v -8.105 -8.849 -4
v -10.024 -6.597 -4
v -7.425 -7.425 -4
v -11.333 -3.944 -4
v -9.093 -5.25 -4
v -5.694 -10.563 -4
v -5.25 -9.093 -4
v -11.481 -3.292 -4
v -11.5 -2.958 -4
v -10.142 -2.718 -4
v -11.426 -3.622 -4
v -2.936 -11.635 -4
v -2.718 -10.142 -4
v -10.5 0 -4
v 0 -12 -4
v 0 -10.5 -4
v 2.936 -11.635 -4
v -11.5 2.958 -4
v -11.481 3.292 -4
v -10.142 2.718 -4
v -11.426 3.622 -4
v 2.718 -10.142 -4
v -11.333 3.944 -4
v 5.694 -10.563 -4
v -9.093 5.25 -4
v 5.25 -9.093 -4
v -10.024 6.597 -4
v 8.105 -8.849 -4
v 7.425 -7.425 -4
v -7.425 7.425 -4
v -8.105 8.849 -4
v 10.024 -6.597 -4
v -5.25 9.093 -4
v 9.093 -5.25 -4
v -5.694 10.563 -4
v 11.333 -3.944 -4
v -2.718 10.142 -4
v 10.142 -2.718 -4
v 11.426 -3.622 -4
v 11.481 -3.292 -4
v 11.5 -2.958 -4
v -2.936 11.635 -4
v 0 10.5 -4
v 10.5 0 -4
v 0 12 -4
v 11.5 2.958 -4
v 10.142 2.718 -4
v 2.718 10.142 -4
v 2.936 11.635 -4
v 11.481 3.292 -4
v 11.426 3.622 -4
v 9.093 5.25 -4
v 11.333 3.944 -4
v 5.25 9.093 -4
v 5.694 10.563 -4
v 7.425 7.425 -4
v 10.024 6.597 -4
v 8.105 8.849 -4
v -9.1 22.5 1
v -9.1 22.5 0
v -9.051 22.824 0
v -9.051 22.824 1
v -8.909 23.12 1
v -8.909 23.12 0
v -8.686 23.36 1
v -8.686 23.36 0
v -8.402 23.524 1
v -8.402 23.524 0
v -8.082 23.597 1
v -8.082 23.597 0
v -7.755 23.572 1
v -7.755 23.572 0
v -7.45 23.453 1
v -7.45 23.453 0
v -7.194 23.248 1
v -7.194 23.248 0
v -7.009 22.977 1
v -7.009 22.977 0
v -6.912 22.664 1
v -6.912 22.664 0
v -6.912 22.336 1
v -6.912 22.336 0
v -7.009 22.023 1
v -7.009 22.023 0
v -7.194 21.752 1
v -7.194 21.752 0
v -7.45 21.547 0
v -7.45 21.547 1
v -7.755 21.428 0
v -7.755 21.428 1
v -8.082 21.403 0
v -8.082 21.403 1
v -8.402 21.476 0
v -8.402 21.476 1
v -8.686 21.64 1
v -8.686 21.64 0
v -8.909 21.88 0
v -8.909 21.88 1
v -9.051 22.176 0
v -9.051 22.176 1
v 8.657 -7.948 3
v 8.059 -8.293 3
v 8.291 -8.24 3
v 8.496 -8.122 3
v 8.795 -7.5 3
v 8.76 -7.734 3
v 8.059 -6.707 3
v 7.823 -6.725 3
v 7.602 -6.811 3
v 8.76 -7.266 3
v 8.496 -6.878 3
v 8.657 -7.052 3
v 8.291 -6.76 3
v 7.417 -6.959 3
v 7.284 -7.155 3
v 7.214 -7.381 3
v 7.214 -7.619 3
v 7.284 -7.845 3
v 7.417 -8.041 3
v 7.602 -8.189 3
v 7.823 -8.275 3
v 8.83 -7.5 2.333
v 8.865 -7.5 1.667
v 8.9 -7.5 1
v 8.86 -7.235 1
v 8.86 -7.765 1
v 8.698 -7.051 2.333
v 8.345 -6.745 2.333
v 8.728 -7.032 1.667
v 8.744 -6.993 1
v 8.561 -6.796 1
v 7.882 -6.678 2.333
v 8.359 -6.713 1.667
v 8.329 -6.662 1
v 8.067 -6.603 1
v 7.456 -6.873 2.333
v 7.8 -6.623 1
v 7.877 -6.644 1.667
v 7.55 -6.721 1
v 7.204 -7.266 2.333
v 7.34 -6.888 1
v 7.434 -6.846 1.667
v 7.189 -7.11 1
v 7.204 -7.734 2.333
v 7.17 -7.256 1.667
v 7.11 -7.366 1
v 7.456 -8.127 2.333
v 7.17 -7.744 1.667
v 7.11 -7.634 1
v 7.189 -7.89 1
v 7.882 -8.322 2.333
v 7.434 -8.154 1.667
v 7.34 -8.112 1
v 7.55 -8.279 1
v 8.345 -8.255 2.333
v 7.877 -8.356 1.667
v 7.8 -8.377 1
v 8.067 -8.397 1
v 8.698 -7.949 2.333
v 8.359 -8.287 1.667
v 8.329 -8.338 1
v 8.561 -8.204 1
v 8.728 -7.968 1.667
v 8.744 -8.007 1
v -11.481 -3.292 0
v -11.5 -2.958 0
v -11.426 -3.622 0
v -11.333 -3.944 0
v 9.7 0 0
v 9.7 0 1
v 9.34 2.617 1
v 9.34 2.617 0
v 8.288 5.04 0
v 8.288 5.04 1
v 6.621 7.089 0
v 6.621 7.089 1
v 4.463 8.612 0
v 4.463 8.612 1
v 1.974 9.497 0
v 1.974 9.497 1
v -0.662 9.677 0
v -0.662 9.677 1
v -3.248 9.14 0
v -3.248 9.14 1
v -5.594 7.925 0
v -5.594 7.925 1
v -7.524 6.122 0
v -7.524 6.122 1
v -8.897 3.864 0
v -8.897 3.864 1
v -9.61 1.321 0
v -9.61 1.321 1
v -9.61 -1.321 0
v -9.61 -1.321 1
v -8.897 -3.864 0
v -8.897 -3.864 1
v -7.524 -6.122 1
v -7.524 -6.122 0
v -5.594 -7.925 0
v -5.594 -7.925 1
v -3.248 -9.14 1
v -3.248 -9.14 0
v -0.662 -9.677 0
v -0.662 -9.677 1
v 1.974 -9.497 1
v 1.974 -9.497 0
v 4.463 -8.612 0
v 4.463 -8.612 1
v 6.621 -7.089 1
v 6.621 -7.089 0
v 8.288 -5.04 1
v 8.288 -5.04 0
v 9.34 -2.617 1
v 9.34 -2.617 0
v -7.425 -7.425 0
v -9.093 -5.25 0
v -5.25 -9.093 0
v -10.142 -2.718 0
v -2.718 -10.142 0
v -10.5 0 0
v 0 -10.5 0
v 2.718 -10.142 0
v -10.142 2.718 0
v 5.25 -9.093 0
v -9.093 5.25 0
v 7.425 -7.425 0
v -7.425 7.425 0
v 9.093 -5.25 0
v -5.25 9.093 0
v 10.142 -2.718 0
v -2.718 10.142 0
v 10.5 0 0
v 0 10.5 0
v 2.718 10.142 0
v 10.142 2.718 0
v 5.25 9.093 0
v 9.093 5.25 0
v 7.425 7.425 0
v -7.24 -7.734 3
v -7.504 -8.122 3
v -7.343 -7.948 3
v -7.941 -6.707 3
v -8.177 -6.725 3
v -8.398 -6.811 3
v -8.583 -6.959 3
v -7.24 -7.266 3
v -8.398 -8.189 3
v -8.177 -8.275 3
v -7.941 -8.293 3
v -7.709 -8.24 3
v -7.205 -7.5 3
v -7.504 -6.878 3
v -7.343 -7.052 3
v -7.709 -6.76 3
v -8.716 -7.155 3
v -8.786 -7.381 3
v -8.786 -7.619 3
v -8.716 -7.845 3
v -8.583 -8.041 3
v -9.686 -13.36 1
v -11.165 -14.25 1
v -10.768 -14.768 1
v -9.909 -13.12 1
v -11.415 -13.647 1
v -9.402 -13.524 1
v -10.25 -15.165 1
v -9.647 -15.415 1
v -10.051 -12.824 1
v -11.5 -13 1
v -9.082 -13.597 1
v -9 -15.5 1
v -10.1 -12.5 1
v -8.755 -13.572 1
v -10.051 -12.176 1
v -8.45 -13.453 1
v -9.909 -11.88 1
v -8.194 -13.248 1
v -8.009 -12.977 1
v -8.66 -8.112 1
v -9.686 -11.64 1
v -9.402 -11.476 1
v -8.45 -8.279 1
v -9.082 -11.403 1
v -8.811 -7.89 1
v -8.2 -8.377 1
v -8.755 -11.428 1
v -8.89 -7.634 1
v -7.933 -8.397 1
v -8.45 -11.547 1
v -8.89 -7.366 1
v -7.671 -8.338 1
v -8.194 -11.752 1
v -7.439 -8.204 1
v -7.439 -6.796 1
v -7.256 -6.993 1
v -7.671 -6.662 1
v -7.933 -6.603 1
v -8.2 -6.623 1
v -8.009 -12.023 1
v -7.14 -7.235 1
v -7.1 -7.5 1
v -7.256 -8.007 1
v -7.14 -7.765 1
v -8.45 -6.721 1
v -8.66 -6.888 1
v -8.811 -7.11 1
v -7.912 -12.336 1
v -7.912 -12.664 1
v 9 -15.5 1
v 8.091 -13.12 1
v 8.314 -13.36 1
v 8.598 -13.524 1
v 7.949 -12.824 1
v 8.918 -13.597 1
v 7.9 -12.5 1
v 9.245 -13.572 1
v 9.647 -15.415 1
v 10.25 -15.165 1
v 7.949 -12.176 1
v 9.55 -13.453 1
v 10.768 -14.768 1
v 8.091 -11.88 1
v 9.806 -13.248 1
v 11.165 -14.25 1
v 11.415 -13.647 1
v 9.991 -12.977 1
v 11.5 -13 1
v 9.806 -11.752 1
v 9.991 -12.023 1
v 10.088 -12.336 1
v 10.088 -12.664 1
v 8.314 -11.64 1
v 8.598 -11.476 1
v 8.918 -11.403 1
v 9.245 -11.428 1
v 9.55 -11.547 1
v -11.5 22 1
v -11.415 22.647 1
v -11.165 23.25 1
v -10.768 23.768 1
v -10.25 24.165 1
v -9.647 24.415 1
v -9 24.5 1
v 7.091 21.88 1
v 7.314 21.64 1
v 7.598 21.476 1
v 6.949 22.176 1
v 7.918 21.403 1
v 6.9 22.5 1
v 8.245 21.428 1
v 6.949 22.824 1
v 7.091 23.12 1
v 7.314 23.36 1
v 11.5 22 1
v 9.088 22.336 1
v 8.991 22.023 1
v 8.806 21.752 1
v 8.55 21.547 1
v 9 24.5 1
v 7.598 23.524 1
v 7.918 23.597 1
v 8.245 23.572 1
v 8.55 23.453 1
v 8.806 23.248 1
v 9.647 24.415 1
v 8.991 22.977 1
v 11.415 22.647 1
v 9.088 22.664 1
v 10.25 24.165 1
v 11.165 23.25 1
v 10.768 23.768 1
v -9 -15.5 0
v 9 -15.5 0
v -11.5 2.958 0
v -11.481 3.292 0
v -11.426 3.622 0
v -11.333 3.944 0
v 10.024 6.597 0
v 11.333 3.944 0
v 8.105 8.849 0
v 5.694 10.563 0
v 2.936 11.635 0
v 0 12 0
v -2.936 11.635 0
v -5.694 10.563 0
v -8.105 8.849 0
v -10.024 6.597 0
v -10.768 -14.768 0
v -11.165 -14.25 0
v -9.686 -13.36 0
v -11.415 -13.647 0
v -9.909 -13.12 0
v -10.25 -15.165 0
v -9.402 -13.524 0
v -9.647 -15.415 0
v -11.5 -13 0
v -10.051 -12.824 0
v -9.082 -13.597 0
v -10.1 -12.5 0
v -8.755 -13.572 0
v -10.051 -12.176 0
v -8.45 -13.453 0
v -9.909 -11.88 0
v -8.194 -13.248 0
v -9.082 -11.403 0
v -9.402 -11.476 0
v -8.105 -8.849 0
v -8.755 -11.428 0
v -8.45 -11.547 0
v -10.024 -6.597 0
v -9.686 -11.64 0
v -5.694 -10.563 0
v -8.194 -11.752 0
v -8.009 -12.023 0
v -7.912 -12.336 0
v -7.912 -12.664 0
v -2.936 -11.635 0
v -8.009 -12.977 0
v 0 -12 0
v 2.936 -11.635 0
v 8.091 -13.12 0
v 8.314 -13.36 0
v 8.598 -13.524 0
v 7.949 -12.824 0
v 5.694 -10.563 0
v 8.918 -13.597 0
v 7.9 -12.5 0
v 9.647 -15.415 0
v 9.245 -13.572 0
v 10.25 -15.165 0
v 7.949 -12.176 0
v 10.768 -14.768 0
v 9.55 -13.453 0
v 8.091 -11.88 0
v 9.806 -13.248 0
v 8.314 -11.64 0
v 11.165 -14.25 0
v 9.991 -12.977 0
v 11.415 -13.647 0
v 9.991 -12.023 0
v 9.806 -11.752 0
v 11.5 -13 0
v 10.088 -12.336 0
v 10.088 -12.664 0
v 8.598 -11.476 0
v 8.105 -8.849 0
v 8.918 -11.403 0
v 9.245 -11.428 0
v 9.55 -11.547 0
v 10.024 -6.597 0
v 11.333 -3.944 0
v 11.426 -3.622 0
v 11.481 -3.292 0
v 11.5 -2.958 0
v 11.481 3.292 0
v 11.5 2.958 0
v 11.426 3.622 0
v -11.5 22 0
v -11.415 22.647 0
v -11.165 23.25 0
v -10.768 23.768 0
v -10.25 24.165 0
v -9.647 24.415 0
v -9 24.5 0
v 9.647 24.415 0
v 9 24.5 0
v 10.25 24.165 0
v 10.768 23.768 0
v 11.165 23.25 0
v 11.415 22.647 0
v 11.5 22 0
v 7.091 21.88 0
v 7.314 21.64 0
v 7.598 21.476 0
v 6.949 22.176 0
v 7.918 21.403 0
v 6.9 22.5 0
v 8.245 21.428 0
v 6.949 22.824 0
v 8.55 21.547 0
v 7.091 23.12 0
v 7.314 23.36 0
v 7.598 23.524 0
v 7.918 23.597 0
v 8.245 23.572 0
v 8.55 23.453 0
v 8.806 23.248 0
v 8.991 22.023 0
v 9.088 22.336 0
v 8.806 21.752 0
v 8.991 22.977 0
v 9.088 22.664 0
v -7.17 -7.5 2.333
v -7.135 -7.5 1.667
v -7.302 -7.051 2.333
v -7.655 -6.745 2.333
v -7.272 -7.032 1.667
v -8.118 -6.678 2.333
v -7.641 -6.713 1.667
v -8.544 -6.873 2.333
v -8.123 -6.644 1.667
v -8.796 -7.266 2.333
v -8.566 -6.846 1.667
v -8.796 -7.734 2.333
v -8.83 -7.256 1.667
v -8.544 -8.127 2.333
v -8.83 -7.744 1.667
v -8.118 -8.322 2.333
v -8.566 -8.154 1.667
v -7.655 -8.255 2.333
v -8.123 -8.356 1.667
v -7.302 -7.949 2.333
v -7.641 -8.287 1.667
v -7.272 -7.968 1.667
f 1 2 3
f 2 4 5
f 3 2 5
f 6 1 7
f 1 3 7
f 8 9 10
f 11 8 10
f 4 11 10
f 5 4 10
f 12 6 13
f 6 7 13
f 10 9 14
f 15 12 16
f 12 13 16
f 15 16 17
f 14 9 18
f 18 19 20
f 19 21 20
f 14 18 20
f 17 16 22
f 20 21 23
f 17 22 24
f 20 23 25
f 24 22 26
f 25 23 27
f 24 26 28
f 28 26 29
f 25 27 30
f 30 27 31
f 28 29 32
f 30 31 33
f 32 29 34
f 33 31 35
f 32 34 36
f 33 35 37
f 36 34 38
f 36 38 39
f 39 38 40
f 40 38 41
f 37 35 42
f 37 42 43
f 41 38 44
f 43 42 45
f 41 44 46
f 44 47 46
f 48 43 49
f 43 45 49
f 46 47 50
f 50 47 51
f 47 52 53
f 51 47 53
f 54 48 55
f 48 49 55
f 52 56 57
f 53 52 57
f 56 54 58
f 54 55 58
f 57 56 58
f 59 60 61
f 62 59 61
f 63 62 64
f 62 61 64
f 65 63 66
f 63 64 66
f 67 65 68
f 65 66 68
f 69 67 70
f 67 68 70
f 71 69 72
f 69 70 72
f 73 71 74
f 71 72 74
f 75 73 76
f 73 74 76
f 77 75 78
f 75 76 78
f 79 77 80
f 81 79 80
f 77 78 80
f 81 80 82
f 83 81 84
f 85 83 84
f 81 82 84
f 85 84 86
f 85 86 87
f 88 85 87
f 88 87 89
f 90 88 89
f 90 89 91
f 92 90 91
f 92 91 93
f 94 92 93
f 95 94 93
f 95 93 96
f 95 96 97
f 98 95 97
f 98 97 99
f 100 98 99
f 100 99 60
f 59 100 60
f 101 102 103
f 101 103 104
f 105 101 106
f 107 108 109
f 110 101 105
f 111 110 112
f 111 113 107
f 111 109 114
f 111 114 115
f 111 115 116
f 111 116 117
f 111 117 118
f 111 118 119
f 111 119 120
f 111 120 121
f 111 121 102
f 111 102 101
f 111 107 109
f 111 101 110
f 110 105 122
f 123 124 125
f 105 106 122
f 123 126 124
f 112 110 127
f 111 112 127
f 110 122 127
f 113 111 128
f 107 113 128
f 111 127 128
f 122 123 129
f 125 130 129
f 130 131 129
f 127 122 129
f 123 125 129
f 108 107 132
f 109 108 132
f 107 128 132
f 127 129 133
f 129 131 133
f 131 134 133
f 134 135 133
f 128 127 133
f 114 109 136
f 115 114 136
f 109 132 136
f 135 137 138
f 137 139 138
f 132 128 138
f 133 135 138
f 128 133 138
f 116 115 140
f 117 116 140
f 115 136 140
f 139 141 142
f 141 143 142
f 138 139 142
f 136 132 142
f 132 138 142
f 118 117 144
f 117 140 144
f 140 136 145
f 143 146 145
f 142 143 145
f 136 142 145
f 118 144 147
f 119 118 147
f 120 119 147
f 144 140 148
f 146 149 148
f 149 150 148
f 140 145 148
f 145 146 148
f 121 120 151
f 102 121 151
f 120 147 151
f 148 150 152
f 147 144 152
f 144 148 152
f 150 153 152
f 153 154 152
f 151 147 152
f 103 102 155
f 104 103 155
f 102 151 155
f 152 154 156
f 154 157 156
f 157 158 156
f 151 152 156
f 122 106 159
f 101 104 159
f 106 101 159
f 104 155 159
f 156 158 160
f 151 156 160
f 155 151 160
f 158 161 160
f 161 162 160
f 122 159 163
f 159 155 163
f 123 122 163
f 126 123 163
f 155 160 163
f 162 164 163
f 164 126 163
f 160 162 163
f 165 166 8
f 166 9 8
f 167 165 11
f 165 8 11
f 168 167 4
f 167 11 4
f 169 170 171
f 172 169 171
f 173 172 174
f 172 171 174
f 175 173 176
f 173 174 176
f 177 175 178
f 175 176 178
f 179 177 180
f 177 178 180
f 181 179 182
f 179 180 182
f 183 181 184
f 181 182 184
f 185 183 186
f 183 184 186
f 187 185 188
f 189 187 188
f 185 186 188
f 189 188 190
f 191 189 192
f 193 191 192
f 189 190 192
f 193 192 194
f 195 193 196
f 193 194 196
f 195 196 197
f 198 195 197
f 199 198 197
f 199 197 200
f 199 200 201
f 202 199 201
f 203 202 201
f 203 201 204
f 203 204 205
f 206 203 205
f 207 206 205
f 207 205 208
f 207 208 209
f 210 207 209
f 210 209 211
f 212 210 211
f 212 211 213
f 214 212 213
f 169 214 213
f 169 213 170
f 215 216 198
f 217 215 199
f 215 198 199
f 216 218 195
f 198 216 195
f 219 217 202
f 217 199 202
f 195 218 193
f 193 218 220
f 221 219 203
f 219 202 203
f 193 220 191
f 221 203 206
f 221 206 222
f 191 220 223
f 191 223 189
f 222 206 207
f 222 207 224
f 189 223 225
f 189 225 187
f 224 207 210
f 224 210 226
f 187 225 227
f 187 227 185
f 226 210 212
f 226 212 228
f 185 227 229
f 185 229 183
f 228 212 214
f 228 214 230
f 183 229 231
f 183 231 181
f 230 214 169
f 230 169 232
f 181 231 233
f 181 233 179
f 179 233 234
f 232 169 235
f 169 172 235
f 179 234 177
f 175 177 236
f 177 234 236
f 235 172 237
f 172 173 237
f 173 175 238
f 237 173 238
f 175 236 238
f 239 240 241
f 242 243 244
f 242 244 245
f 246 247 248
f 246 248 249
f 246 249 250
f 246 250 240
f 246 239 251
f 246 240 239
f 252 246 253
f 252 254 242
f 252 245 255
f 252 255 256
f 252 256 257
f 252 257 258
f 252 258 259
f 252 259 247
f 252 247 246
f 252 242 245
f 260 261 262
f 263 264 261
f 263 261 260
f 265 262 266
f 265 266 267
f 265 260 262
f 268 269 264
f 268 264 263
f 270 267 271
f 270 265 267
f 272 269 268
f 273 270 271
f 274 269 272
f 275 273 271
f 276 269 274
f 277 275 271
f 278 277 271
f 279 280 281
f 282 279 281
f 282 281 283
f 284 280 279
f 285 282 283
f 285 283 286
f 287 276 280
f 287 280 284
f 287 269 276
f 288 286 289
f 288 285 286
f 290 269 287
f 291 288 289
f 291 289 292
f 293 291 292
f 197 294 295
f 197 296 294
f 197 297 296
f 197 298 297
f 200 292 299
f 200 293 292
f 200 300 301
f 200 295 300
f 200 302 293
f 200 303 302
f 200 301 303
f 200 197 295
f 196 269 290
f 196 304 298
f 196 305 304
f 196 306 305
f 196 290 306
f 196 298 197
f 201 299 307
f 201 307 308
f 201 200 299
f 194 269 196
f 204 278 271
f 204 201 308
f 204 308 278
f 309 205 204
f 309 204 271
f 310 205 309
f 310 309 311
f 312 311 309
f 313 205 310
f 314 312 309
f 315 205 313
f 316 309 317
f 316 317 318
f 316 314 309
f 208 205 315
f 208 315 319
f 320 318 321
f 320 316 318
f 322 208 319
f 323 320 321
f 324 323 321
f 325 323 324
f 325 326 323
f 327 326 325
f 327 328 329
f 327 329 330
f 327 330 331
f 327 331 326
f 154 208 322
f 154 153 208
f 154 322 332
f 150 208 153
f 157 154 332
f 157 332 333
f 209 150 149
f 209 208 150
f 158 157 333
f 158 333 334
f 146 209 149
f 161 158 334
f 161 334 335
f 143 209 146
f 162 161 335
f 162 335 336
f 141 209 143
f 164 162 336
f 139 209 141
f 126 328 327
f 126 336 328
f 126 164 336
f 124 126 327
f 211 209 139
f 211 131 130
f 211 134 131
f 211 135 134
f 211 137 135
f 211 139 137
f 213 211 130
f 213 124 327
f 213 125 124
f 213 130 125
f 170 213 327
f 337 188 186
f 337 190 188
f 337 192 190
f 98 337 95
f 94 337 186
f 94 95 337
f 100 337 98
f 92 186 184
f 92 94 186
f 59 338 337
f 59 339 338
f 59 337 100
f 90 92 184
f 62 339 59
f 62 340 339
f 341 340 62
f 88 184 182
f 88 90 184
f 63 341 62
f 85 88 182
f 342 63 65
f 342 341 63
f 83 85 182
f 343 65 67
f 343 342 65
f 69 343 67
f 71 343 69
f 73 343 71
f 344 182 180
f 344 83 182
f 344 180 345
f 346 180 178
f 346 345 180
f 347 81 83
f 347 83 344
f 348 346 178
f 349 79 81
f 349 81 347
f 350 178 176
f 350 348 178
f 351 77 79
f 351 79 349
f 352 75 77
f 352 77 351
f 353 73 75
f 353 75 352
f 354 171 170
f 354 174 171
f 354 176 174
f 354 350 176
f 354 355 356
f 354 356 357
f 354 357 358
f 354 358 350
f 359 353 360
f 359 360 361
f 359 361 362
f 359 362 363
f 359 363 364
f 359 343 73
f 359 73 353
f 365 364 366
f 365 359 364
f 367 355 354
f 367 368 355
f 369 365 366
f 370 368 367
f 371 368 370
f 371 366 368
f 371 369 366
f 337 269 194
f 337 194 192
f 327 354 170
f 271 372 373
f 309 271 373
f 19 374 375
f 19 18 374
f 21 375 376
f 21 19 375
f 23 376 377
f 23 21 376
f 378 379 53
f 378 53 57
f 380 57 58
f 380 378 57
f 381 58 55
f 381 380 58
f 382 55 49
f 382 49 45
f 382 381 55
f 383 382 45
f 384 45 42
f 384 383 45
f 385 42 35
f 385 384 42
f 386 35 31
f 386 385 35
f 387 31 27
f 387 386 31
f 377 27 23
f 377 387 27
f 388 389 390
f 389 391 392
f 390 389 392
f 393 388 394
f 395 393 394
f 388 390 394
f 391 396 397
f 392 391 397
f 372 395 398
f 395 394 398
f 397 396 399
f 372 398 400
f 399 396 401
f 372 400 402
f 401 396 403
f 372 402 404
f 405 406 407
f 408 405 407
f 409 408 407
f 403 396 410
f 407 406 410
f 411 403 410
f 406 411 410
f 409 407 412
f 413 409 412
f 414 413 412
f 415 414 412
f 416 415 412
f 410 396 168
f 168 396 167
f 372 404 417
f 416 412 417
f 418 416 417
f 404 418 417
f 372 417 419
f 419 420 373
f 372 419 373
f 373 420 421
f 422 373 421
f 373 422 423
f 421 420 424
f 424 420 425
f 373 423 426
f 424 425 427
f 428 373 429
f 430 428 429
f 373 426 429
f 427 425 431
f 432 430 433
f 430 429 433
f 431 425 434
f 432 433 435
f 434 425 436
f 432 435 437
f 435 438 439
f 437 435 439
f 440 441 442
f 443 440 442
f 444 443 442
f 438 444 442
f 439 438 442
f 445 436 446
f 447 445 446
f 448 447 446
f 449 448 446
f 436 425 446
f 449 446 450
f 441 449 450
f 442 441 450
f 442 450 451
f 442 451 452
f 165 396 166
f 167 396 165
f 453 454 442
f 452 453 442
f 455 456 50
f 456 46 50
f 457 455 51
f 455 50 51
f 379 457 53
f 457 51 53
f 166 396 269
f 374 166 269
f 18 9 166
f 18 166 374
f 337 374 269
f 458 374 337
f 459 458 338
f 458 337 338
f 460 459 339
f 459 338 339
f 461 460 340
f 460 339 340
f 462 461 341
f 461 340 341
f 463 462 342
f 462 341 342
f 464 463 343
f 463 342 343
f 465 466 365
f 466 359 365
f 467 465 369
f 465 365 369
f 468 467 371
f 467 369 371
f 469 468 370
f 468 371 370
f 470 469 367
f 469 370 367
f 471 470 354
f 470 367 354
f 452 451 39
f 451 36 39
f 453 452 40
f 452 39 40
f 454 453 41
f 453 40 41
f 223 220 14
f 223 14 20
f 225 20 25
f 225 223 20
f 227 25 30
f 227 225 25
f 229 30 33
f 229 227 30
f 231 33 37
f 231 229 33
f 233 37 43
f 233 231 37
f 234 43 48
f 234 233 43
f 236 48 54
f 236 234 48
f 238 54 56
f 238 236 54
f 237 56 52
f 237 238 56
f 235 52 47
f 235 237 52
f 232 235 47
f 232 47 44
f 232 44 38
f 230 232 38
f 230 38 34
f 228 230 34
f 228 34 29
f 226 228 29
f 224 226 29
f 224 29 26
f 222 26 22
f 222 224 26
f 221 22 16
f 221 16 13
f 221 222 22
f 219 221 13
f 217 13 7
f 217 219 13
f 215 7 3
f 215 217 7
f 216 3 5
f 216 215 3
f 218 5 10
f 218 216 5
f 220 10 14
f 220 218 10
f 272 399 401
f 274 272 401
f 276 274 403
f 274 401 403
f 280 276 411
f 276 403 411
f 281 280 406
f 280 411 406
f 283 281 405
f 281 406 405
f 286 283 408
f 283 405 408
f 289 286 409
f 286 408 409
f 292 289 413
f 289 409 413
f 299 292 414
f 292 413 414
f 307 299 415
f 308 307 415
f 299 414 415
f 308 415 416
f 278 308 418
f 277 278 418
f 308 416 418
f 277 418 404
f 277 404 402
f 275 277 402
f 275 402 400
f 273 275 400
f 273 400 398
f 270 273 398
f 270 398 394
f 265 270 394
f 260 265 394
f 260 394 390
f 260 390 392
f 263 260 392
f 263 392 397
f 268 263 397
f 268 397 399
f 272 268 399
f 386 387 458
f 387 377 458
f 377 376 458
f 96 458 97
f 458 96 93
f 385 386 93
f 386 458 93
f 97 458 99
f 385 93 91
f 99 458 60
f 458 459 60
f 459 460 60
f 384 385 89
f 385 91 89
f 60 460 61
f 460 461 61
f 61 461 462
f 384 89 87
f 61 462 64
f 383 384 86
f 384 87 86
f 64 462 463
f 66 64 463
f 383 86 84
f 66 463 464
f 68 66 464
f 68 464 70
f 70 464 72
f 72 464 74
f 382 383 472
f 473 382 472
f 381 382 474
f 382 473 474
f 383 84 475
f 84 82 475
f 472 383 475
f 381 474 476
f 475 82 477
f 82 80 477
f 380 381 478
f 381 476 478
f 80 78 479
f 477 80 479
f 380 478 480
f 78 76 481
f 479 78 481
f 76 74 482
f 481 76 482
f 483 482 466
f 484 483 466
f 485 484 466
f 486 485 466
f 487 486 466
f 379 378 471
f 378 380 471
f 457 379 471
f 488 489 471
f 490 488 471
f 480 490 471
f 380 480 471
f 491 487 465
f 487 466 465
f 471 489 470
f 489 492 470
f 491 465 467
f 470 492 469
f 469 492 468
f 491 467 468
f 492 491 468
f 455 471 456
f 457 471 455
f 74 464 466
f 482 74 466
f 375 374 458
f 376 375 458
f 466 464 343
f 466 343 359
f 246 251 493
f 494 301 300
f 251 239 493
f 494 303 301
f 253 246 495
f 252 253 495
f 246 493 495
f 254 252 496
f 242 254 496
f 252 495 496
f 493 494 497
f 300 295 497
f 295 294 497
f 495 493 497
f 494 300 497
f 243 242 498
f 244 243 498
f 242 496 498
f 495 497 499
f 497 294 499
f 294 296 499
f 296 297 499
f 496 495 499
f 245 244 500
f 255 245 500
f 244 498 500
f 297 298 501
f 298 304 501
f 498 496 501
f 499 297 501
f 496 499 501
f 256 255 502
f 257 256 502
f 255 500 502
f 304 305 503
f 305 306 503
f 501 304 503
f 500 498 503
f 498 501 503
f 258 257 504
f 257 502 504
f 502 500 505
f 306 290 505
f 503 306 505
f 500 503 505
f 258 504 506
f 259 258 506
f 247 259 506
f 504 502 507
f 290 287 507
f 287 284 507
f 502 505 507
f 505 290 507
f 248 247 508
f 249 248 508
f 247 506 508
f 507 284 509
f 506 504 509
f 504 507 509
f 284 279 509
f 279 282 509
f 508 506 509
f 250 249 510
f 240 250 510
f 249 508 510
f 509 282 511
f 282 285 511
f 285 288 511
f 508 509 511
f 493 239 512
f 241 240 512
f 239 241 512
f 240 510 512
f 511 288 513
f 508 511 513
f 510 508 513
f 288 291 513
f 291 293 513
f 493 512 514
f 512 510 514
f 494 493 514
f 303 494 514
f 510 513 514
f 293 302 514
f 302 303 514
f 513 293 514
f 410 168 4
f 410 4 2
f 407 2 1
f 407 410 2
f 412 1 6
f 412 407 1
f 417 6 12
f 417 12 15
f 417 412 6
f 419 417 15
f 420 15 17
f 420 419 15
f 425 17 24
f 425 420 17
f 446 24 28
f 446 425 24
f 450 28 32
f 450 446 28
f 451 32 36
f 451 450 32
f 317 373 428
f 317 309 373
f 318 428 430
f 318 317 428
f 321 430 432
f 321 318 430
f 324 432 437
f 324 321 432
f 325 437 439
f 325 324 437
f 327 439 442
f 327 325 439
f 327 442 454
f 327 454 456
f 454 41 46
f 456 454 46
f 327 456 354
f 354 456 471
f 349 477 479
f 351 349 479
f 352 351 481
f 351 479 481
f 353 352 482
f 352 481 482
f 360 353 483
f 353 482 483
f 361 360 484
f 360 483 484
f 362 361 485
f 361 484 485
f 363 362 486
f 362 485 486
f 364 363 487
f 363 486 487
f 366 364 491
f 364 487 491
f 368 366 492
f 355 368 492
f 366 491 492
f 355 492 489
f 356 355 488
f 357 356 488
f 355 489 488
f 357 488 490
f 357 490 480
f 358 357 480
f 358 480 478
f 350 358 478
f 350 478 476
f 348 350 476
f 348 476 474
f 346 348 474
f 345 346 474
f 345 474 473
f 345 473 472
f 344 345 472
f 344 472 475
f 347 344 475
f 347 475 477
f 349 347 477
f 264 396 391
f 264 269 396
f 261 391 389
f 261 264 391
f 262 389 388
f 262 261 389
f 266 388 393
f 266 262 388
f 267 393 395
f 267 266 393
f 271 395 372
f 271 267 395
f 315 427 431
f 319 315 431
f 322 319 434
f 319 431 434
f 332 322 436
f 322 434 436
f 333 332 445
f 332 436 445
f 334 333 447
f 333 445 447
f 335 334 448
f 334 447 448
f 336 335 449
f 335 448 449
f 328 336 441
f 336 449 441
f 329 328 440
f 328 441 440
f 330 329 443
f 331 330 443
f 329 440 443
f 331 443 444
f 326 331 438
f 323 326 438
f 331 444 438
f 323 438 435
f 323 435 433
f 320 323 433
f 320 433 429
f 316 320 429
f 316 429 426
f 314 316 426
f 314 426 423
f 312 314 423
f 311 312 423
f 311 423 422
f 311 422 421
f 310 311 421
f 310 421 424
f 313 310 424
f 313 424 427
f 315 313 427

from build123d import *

# Parameters (mm, degrees)
SKETCH_1_W                = 23
SKETCH_1_H                = 40
EXTRUDE_1_DEPTH           = 1
SKETCH_2_R                = 9.7
CUT_EXTRUDE_1_DEPTH       = 28.083205128
FILLET_1_R                = 2.5
HOLE_WIZARD_M2_1_D        = 2.2
SKETCH_7_R                = 0.9
EXTRUDE_2_DEPTH           = 2
EXTRUDE_2_DRAFT           = 3
EXTRUDE_2_PROFILE_2_DEPTH = 2
EXTRUDE_2_PROFILE_2_DRAFT = 3
SKETCH_8_R                = 10.5
EXTRUDE_3_DEPTH           = 4
FILLET_2_R                = 3


with BuildPart() as part:
    # 草图1 → 凸台-拉伸1 (new body)
    with BuildSketch(Plane.XY):
        with Locations((0, 4.5)):
            Rectangle(SKETCH_1_W, SKETCH_1_H)
    extrude(amount=EXTRUDE_1_DEPTH)

    # 草图2 → 切除-拉伸1 (cut, through all)
    with BuildSketch(Plane.XY.offset(1)):
        Circle(SKETCH_2_R)
    extrude(amount=-CUT_EXTRUDE_1_DEPTH, mode=Mode.SUBTRACT)

    # 圆角1
    fillet_1_edges = [part.edges().sort_by_distance(p)[0] for p in [
        (-11.5, 24.5, 0.5),
        (11.5, 24.5, 0.5),
        (11.5, -15.5, 0.5),
        (-11.5, -15.5, 0.5),
    ]]
    fillet(fillet_1_edges, radius=FILLET_1_R)

    # M2 间隙孔1 (through all)
    with Locations(Plane.XY.offset(1)):
        with Locations((-8, 22.5), (8, 22.5), (-9, -12.5), (9, -12.5)):
            Hole(HOLE_WIZARD_M2_1_D / 2)


with BuildPart() as extrude_2_tool:
    # 草图7 → 凸台-拉伸2 (with draft: the straight prism first)
    with BuildSketch(Plane.XY.offset(1)):
        with Locations((-8, -7.5)):
            Circle(SKETCH_7_R)
    extrude(amount=EXTRUDE_2_DEPTH)
    # 凸台-拉伸2: the draft: its side faces are tilted about the plane it starts from
    extrude_2_sides = [extrude_2_tool.faces().sort_by_distance(p)[0] for p in [
        (-8.9, -7.5, 2),
    ]]
    draft(extrude_2_sides, Plane.XY.offset(1), EXTRUDE_2_DRAFT)


with BuildPart() as part_1:
    add(part.part)

    # 凸台-拉伸2: add extrude_2_tool
    add(extrude_2_tool.part)


with BuildPart() as extrude_2_profile_2_tool:
    # 草图7 → 凸台-拉伸2 profile 2 (with draft: the straight prism first)
    with BuildSketch(Plane.XY.offset(1)):
        with Locations((8, -7.5)):
            Circle(SKETCH_7_R)
    extrude(amount=EXTRUDE_2_PROFILE_2_DEPTH)
    # 凸台-拉伸2 profile 2: the draft: its side faces are tilted about the plane it starts from
    extrude_2_profile_2_sides = [extrude_2_profile_2_tool.faces().sort_by_distance(p)[0] for p in [
        (7.1, -7.5, 2),
    ]]
    draft(extrude_2_profile_2_sides, Plane.XY.offset(1), EXTRUDE_2_PROFILE_2_DRAFT)


with BuildPart() as part_2:
    add(part_1.part)

    # 凸台-拉伸2 profile 2: add extrude_2_profile_2_tool
    add(extrude_2_profile_2_tool.part)

    # 草图8 → 凸台-拉伸3 (add)
    with BuildSketch(Plane(origin=(0, 0, 0), x_dir=(-1, 0, 0), z_dir=(0, 0, -1))):
        with BuildLine():
            Line((11.5, 3.4278273), (11.5, -3.4278273))
            ThreePointArc((11.5, -3.4278273), (0, -12), (-11.5, -3.4278273))
            Line((-11.5, -3.4278273), (-11.5, 3.4278273))
            ThreePointArc((-11.5, 3.4278273), (0, 12), (11.5, 3.4278273))
        make_face()
        Circle(SKETCH_8_R, mode=Mode.SUBTRACT)
    extrude(amount=EXTRUDE_3_DEPTH)

    # 圆角2
    fillet_2_edges = [part_2.edges().sort_by_distance(p)[0] for p in [
        (-11.5, 3.4278273, -2),
        (11.5, 3.4278273, -2),
        (11.5, -3.4278273, -2),
        (-11.5, -3.4278273, -2),
    ]]
    fillet(fillet_2_edges, radius=FILLET_2_R)


solid = part_2.part
